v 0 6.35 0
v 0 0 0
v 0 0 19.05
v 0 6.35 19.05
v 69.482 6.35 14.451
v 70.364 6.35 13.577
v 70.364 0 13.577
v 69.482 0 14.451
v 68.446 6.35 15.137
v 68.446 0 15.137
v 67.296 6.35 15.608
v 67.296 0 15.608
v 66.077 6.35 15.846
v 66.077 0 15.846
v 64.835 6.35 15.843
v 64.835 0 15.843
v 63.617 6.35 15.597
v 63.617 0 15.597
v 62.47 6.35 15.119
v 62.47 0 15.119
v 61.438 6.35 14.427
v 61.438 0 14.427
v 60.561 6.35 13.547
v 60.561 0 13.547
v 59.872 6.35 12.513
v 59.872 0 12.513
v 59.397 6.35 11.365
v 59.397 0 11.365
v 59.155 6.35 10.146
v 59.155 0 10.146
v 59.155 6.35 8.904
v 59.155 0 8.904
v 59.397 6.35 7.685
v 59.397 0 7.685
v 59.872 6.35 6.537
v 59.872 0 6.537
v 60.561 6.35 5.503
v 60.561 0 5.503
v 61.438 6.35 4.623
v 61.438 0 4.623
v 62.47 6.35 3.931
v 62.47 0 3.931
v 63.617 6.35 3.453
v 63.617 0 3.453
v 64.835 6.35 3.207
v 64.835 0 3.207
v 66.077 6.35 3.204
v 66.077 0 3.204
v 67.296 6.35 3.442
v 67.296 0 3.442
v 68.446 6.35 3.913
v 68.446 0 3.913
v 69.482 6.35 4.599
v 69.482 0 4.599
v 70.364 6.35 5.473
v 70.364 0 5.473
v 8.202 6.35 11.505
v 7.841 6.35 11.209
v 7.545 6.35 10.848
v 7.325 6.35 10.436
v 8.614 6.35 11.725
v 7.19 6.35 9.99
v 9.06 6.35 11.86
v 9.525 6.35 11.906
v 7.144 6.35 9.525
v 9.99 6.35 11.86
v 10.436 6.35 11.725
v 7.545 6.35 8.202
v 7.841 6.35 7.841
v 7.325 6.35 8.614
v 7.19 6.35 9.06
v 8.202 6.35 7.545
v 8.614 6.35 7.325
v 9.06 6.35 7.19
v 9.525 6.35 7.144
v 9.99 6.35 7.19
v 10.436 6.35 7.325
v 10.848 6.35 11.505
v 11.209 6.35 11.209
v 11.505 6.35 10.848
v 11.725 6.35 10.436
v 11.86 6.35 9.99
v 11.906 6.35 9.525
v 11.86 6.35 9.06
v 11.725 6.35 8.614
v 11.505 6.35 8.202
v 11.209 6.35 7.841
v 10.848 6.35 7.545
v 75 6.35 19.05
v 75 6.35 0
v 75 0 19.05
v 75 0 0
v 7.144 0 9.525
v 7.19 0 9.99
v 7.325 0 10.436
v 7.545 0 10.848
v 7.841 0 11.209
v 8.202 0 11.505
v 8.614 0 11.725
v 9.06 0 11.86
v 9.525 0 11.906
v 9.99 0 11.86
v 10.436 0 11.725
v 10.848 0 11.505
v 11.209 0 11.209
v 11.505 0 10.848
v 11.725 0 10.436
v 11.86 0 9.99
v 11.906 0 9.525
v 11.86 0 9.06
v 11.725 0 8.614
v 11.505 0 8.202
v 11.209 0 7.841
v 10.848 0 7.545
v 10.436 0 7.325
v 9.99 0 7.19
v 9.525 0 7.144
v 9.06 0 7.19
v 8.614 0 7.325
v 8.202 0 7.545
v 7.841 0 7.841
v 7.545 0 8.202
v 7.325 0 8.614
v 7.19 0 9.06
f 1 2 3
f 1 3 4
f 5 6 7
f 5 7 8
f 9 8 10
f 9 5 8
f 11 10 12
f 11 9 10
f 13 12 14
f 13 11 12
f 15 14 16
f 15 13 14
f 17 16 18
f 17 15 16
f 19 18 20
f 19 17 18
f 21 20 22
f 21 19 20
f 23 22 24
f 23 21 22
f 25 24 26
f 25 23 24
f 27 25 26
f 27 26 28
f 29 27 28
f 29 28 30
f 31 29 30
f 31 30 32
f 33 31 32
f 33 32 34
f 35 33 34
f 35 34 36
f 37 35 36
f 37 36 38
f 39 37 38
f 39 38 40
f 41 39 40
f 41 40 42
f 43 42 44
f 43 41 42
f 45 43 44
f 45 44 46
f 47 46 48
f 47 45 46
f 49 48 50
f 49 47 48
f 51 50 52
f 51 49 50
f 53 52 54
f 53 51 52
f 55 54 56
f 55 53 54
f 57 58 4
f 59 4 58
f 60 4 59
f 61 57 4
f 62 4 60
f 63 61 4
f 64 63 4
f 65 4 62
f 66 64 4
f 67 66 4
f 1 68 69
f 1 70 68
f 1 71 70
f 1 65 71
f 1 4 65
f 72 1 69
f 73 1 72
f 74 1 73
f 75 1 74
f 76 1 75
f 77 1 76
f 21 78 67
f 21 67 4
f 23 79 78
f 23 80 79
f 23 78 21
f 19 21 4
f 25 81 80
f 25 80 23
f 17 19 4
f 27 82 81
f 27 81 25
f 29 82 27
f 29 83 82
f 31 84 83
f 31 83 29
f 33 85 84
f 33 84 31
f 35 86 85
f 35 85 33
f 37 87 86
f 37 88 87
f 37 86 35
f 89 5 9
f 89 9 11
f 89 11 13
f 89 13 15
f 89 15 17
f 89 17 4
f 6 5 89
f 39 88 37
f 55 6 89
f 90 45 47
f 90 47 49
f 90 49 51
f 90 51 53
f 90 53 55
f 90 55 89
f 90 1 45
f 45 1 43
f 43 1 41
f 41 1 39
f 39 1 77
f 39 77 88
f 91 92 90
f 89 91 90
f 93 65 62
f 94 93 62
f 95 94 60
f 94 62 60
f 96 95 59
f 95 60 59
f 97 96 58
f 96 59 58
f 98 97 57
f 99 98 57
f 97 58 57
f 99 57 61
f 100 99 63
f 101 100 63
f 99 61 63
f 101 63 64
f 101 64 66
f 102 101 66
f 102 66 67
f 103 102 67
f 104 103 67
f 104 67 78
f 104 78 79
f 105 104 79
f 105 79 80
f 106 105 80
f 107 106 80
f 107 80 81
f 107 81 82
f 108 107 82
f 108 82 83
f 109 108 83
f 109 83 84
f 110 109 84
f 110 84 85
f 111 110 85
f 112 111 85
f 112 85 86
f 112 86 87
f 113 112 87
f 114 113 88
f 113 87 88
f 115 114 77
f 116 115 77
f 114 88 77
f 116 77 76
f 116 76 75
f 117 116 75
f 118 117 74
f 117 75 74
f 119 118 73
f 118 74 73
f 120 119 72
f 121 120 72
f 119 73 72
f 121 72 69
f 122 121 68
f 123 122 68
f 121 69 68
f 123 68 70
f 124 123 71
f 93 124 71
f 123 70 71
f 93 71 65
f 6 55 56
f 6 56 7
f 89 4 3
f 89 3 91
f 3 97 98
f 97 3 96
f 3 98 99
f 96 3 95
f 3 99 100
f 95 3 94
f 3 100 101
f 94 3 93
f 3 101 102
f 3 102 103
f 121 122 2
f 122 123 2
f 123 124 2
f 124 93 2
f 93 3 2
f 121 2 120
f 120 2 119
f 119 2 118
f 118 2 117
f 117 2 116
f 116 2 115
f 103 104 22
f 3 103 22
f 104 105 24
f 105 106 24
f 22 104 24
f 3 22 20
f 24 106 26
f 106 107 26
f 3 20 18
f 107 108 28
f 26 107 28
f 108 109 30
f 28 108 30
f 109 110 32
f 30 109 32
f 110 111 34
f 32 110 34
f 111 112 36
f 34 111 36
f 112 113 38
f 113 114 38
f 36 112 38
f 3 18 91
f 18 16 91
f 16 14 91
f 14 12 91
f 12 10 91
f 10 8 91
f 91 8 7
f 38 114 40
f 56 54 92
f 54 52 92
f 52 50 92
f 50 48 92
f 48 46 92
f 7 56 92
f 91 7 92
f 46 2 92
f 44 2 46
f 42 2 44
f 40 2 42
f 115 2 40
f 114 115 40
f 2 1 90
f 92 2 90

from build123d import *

# Parameters (mm, degrees)
SKETCH1_W          = 75
SKETCH1_H          = 6.35
BASE_EXTRUDE_DEPTH = 19.05
CUT_EXTRUDE1_DEPTH = 78.641644753
SKETCH3_R          = 2.38125
CUT_EXTRUDE2_DEPTH = 78.641644753


with BuildPart() as part:
    # Sketch1 → Base-Extrude (new body)
    with BuildSketch(Plane.XY):
        with Locations((37.5, 3.175)):
            Rectangle(SKETCH1_W, SKETCH1_H)
    extrude(amount=BASE_EXTRUDE_DEPTH)

    # Sketch2 → Cut-Extrude1 (cut, through all)
    with BuildSketch(Plane(origin=(0, 6.35, 0), x_dir=(-1, 0, 0), z_dir=(0, 1, 0))):
        with BuildLine():
            Line((-70.3645, 5.473421326), (-70.3645, 13.576578674))
            ThreePointArc((-70.3645, 13.576578674), (-59.125, 9.525), (-70.3645, 5.473421326))
        make_face()
    extrude(amount=-CUT_EXTRUDE1_DEPTH, mode=Mode.SUBTRACT)

    # Sketch3 → Cut-Extrude2 (cut, through all)
    with BuildSketch(Plane(origin=(0, 6.35, 0), x_dir=(-1, 0, 0), z_dir=(0, 1, 0))):
        with Locations((-9.525, 9.525)):
            Circle(SKETCH3_R)
    extrude(amount=-CUT_EXTRUDE2_DEPTH, mode=Mode.SUBTRACT)


solid = part.part
